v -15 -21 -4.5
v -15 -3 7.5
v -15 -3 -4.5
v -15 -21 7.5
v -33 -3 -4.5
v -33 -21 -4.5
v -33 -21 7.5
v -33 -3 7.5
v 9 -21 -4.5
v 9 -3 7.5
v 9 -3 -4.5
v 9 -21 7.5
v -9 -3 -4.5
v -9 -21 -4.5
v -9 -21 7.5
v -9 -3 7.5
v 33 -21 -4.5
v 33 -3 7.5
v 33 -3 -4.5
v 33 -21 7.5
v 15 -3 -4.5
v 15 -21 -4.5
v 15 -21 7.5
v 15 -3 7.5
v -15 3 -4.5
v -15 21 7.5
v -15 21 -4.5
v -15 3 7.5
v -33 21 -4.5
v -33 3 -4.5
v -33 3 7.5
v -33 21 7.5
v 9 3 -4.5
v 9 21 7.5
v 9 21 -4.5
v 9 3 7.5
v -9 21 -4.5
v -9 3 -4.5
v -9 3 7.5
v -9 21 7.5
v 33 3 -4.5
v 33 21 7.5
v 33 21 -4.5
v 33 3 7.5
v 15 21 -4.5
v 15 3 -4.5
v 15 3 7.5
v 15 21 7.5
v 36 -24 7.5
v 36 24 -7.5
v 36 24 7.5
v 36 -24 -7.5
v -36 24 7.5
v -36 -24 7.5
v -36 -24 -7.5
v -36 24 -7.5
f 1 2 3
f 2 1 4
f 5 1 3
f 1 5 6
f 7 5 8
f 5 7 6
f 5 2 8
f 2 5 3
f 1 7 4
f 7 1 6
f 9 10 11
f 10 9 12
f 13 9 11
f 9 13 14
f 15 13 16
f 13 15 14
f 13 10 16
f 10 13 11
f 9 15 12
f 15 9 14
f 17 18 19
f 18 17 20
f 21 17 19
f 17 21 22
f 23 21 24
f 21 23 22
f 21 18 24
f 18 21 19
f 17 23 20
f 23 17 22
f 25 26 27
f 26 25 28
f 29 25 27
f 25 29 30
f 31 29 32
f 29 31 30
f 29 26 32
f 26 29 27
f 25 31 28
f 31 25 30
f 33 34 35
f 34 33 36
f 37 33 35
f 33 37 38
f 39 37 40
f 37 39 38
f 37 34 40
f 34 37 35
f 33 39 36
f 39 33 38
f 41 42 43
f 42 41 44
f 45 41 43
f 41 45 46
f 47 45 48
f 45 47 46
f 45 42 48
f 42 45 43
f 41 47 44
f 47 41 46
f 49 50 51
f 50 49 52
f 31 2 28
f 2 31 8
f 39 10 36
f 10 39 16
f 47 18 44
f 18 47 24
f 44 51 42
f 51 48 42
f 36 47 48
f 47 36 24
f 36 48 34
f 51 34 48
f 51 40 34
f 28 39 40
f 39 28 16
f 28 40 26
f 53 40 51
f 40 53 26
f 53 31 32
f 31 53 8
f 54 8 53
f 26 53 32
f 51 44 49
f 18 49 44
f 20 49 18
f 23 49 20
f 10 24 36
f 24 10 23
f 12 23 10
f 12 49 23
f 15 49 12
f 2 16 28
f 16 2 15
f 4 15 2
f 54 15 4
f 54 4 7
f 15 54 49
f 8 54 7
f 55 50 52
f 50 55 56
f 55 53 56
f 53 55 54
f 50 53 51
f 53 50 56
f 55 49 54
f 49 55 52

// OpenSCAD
$fn = 32;

// ----------------------------------------------------------------------
// Pocket plate 72 x 48 x 15
// 2 x 3 pockets 18 mm square, 12 mm deep
// ----------------------------------------------------------------------

// --- parameters (mm) ---
thickness = 15;  // plate thickness
floor_t = 3;     // material left under each pocket
pocket = 18;     // pocket side length
pitch_x = 24;    // pocket pitch along X
pitch_y = 24;    // pocket pitch along Y
cols = 3;        // pockets per row
rows = 2;        // rows of pockets

// --- derived feature positions (mm) ---
depth = thickness - floor_t;        // = 12   pocket depth, down to the floor
span_x = (cols - 1) * pitch_x;      // = 48   distance between outer pockets
span_y = (rows - 1) * pitch_y;      // = 24   distance between outer pocket rows
origin_x = -span_x / 2;             // = -24   X of the first pocket
origin_y = -span_y / 2;             // = -12   Y of the first pocket
plate = [span_x + pocket + 6, span_y + pocket + 6, thickness];  // = [72, 48, 15]   overall size: pockets plus 3 mm of wall on each side
feature_centers = [
  [origin_x + 0 * pitch_x, origin_y + 0 * pitch_y],
  [origin_x + 1 * pitch_x, origin_y + 0 * pitch_y],
  [origin_x + 2 * pitch_x, origin_y + 0 * pitch_y],
  [origin_x + 0 * pitch_x, origin_y + 1 * pitch_y],
  [origin_x + 1 * pitch_x, origin_y + 1 * pitch_y],
  [origin_x + 2 * pitch_x, origin_y + 1 * pitch_y]
];   // pocket centres, used verbatim by the cutter loop

// plate outline, then one pocket per centre in feature_centers
difference() {
  cube(plate, center = true);
  for (centre = feature_centers)
    translate([centre[0] - pocket / 2, centre[1] - pocket / 2, plate[2] / 2 - depth])
      cube([pocket, pocket, depth + 1]);  // centred on the declared pocket centre
}
